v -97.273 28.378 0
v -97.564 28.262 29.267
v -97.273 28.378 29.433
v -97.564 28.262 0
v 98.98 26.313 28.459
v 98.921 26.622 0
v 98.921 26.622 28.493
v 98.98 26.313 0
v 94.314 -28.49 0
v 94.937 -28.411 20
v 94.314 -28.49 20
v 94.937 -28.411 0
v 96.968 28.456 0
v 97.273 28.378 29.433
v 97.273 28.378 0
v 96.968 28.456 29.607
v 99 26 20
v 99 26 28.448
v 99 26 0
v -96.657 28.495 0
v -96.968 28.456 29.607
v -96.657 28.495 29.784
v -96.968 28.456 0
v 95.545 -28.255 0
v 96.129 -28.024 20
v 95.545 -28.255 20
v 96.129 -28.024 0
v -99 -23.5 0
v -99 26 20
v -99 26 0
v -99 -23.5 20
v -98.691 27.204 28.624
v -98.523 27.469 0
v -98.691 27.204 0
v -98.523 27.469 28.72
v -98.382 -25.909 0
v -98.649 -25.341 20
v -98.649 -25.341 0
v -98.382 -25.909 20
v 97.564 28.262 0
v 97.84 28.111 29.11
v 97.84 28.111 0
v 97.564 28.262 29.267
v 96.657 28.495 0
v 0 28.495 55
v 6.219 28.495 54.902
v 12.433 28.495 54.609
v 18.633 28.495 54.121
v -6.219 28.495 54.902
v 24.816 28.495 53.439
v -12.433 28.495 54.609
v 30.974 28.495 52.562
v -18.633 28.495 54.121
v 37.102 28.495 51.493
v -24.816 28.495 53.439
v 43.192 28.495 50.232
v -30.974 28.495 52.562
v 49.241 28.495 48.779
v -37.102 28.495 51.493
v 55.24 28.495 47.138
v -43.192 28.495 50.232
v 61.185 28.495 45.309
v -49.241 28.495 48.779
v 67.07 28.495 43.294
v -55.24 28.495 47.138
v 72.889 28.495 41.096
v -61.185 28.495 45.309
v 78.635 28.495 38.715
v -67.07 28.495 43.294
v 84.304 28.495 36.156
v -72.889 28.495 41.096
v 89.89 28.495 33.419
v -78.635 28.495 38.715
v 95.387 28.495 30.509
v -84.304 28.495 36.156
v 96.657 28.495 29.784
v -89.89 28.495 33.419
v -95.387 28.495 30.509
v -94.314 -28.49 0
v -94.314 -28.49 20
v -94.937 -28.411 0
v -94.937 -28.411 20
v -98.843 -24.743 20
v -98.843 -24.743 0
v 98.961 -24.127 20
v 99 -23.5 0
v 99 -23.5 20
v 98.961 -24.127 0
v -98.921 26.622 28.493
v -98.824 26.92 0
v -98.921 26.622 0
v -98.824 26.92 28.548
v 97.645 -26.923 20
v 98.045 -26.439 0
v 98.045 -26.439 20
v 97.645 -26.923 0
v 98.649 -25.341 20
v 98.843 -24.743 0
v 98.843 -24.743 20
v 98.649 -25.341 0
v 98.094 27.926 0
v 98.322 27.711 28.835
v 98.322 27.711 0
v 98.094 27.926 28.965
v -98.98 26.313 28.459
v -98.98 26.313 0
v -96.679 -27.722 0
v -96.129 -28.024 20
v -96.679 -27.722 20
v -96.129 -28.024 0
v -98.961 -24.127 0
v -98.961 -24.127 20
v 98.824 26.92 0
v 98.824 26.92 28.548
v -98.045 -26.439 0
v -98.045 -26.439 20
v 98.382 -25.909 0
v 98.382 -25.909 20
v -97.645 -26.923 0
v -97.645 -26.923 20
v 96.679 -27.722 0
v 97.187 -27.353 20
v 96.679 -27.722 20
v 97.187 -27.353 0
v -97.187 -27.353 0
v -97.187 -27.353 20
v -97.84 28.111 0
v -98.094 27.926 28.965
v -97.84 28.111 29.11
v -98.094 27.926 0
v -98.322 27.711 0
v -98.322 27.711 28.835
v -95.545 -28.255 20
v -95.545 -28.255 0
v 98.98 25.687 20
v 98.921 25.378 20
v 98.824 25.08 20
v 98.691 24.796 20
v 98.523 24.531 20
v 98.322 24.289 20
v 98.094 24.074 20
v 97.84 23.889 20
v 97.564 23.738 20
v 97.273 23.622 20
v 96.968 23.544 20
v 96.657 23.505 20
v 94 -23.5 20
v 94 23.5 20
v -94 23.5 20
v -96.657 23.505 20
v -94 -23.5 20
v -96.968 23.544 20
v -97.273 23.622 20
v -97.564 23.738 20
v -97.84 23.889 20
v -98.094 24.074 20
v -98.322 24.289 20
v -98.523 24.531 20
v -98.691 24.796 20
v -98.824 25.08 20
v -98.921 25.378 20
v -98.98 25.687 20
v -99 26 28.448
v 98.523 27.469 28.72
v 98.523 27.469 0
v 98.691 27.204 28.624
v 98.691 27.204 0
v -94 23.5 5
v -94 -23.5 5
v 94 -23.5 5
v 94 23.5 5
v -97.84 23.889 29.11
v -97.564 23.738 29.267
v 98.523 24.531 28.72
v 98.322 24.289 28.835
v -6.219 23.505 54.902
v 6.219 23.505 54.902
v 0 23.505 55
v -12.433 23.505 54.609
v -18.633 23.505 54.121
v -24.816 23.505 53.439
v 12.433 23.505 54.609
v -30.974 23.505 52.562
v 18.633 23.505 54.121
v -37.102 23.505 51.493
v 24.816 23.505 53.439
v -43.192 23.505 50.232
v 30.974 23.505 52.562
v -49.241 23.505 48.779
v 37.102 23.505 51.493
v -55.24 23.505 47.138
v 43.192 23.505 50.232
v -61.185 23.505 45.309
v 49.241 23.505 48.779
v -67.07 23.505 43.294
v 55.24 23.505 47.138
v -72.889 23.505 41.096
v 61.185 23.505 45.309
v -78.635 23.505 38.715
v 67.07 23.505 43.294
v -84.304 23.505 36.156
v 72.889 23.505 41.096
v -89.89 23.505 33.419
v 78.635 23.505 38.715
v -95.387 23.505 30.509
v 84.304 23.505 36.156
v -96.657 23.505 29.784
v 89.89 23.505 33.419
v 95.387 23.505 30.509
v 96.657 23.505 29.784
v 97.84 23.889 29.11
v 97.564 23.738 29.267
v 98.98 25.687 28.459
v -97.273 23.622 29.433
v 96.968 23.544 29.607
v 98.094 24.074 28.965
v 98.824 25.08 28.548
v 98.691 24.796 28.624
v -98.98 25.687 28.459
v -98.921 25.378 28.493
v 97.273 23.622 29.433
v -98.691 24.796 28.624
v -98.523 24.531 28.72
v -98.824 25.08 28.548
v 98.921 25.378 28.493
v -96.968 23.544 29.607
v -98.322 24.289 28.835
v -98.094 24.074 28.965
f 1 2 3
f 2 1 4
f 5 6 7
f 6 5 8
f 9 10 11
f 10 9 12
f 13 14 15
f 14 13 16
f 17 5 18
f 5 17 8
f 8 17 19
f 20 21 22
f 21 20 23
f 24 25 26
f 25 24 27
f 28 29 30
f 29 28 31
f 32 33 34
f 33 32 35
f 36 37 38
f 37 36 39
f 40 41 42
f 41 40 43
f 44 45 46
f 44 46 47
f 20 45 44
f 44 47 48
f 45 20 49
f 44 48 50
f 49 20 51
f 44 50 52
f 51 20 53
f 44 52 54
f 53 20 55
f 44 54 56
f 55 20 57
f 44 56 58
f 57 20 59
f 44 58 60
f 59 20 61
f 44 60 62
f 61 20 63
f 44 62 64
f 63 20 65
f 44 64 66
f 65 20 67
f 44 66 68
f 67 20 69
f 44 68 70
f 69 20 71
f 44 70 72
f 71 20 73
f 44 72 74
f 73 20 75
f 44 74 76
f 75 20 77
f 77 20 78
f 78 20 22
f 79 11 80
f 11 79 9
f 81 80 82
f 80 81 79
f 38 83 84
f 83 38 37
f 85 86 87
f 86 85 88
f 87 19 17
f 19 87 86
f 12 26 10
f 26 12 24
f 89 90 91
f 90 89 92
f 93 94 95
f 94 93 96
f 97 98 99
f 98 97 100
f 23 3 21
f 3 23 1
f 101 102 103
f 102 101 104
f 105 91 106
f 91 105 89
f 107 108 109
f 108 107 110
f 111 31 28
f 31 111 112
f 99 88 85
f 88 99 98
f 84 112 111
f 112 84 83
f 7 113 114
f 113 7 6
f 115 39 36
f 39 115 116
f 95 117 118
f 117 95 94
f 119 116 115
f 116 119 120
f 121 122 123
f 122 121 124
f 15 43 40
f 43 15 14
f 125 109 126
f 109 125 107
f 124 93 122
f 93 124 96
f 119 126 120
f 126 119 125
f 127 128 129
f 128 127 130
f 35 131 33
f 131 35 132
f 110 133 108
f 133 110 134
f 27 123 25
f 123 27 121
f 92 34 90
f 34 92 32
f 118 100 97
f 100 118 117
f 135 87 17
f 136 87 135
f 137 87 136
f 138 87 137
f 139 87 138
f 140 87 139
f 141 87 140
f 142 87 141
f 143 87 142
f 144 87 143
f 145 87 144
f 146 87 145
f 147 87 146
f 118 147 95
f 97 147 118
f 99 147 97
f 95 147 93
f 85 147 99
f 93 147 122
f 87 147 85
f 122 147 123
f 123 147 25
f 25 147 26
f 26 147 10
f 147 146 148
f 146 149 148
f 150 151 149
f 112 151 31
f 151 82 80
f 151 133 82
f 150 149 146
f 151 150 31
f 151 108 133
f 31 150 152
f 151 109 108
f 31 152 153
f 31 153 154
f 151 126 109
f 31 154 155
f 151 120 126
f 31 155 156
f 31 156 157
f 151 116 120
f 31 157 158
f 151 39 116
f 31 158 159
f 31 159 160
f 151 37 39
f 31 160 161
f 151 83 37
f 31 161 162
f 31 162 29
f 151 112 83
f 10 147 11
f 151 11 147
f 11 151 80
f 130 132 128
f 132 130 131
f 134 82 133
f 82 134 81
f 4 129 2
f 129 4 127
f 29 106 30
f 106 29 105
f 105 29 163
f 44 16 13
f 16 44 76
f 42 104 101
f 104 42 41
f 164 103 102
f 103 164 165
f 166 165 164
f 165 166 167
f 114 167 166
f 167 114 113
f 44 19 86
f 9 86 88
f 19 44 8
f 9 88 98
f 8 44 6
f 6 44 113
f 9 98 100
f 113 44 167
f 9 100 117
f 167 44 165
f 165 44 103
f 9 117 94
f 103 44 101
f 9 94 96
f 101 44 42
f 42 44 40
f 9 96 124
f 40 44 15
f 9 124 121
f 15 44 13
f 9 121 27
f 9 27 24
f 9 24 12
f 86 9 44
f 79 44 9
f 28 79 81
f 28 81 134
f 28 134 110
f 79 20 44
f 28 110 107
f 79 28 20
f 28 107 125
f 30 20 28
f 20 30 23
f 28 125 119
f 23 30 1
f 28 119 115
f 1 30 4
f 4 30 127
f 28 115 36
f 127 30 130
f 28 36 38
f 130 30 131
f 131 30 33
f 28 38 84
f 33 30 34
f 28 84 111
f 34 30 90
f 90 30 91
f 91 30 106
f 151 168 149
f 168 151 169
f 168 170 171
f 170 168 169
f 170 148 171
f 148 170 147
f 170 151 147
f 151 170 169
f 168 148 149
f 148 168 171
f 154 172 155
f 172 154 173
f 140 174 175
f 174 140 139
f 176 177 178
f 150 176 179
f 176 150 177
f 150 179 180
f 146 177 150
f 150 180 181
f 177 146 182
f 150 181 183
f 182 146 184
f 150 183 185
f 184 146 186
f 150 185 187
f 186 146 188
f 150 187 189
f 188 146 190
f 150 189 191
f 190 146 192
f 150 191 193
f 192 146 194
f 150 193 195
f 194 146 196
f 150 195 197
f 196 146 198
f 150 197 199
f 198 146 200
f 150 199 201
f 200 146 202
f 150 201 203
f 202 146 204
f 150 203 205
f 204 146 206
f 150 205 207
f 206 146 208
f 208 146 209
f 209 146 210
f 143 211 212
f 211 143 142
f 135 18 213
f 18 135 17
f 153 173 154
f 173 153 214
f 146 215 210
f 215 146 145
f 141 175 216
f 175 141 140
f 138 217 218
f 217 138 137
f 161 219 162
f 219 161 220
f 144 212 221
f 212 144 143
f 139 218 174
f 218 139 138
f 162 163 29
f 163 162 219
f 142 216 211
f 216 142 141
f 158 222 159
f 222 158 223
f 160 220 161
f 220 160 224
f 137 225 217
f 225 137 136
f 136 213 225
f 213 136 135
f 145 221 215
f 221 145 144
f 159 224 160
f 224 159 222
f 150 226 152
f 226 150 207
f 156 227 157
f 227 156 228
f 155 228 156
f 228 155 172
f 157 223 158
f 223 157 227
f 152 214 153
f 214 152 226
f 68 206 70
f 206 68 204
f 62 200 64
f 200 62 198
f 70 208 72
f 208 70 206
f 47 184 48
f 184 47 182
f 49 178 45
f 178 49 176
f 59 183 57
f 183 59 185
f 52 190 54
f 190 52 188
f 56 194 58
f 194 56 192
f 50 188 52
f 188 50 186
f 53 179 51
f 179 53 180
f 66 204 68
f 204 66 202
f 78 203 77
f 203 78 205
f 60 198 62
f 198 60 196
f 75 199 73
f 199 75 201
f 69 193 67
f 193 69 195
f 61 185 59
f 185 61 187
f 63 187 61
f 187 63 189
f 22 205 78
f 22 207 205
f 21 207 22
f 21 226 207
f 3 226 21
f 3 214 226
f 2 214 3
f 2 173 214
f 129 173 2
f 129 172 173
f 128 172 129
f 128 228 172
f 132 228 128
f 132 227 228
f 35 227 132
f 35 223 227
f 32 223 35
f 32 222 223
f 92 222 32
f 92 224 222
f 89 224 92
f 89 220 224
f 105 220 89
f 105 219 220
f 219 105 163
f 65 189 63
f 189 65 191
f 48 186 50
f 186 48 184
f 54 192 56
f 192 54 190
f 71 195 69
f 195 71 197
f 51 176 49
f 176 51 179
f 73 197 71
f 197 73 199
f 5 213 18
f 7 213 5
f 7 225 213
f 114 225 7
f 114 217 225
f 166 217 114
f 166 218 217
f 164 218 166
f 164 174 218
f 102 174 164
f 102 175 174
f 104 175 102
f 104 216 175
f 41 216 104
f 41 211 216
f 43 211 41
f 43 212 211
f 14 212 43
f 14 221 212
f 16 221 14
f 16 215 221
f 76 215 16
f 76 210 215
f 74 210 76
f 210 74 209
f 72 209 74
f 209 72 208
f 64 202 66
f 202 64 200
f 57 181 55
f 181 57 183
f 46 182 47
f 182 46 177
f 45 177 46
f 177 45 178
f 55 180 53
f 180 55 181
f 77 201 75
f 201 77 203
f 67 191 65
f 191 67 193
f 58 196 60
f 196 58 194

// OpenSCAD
container_diameter = 42; // [20:80]
container_margin = 5; // [5,10,15,20]
container_count = 4; // [1:15]

wall_thicknes = 5; // [3:20]

tray_height = 20; // [20:60]
back_height = 55; // [30:100]

print_part();

module print_part() {
    inner_size_x = container_count * (container_diameter + container_margin);
    inner_size_y = container_diameter + container_margin;
    inner_size_z = tray_height - wall_thicknes;

    outer_size_x = inner_size_x + (2 * wall_thicknes);
    outer_size_y = inner_size_y + (2 * wall_thicknes);
    outer_size_z = tray_height;

    rotate ([0,0,180]) {
        intersection() {
            union() {
                difference() {

                    radius = 5;


                    linear_extrude(height=outer_size_z) {
                        hull() {
                            translate([(-outer_size_x/2)+(radius/2), (-outer_size_y/2)+(radius/2), 0])
                            circle(r=radius/2,$fn=50);

                            translate([(outer_size_x/2)-(radius/2), (-outer_size_y/2)+(radius/2), 0])
                            circle(r=radius/2,$fn=50);

                            translate([(-outer_size_x/2)+(radius), (outer_size_y/2)-(radius), 0])
                            circle(r=radius,$fn=50);

                            translate([(outer_size_x/2)-(radius), (outer_size_y/2)-(radius), 0])
                            circle(r=radius,$fn=50);
                        }
                    }

                    translate([- inner_size_x / 2, -inner_size_y / 2, wall_thicknes]) {
                        cube([inner_size_x, inner_size_y, inner_size_z]);
                    }
                }


                translate([0,0,0]) {
                    back_size_x = inner_size_x + (2 * wall_thicknes);
                    back_size_y = inner_size_y + (2 * wall_thicknes);
                    back_size_z = back_height;

                    radius = 2.5;
                    linear_extrude(height=back_size_z) {
                        hull()
                        {
                            translate([(-back_size_x/2)+(radius), (-back_size_y/2)+(radius), 0])
                            circle(r=radius,$fn=50);

                            translate([(back_size_x/2)-(radius), (-back_size_y/2)+(radius), 0])
                            circle(r=radius,$fn=50);
                        }
                    }
                }
            }

            back_radius = outer_size_x;

            translate([0,0,-(back_radius - back_height)]) {
                rotate([90,0,0]) {
                    cylinder(outer_size_y,back_radius, back_radius,true, $fn=200);
                }
            }
        }
    }
}
